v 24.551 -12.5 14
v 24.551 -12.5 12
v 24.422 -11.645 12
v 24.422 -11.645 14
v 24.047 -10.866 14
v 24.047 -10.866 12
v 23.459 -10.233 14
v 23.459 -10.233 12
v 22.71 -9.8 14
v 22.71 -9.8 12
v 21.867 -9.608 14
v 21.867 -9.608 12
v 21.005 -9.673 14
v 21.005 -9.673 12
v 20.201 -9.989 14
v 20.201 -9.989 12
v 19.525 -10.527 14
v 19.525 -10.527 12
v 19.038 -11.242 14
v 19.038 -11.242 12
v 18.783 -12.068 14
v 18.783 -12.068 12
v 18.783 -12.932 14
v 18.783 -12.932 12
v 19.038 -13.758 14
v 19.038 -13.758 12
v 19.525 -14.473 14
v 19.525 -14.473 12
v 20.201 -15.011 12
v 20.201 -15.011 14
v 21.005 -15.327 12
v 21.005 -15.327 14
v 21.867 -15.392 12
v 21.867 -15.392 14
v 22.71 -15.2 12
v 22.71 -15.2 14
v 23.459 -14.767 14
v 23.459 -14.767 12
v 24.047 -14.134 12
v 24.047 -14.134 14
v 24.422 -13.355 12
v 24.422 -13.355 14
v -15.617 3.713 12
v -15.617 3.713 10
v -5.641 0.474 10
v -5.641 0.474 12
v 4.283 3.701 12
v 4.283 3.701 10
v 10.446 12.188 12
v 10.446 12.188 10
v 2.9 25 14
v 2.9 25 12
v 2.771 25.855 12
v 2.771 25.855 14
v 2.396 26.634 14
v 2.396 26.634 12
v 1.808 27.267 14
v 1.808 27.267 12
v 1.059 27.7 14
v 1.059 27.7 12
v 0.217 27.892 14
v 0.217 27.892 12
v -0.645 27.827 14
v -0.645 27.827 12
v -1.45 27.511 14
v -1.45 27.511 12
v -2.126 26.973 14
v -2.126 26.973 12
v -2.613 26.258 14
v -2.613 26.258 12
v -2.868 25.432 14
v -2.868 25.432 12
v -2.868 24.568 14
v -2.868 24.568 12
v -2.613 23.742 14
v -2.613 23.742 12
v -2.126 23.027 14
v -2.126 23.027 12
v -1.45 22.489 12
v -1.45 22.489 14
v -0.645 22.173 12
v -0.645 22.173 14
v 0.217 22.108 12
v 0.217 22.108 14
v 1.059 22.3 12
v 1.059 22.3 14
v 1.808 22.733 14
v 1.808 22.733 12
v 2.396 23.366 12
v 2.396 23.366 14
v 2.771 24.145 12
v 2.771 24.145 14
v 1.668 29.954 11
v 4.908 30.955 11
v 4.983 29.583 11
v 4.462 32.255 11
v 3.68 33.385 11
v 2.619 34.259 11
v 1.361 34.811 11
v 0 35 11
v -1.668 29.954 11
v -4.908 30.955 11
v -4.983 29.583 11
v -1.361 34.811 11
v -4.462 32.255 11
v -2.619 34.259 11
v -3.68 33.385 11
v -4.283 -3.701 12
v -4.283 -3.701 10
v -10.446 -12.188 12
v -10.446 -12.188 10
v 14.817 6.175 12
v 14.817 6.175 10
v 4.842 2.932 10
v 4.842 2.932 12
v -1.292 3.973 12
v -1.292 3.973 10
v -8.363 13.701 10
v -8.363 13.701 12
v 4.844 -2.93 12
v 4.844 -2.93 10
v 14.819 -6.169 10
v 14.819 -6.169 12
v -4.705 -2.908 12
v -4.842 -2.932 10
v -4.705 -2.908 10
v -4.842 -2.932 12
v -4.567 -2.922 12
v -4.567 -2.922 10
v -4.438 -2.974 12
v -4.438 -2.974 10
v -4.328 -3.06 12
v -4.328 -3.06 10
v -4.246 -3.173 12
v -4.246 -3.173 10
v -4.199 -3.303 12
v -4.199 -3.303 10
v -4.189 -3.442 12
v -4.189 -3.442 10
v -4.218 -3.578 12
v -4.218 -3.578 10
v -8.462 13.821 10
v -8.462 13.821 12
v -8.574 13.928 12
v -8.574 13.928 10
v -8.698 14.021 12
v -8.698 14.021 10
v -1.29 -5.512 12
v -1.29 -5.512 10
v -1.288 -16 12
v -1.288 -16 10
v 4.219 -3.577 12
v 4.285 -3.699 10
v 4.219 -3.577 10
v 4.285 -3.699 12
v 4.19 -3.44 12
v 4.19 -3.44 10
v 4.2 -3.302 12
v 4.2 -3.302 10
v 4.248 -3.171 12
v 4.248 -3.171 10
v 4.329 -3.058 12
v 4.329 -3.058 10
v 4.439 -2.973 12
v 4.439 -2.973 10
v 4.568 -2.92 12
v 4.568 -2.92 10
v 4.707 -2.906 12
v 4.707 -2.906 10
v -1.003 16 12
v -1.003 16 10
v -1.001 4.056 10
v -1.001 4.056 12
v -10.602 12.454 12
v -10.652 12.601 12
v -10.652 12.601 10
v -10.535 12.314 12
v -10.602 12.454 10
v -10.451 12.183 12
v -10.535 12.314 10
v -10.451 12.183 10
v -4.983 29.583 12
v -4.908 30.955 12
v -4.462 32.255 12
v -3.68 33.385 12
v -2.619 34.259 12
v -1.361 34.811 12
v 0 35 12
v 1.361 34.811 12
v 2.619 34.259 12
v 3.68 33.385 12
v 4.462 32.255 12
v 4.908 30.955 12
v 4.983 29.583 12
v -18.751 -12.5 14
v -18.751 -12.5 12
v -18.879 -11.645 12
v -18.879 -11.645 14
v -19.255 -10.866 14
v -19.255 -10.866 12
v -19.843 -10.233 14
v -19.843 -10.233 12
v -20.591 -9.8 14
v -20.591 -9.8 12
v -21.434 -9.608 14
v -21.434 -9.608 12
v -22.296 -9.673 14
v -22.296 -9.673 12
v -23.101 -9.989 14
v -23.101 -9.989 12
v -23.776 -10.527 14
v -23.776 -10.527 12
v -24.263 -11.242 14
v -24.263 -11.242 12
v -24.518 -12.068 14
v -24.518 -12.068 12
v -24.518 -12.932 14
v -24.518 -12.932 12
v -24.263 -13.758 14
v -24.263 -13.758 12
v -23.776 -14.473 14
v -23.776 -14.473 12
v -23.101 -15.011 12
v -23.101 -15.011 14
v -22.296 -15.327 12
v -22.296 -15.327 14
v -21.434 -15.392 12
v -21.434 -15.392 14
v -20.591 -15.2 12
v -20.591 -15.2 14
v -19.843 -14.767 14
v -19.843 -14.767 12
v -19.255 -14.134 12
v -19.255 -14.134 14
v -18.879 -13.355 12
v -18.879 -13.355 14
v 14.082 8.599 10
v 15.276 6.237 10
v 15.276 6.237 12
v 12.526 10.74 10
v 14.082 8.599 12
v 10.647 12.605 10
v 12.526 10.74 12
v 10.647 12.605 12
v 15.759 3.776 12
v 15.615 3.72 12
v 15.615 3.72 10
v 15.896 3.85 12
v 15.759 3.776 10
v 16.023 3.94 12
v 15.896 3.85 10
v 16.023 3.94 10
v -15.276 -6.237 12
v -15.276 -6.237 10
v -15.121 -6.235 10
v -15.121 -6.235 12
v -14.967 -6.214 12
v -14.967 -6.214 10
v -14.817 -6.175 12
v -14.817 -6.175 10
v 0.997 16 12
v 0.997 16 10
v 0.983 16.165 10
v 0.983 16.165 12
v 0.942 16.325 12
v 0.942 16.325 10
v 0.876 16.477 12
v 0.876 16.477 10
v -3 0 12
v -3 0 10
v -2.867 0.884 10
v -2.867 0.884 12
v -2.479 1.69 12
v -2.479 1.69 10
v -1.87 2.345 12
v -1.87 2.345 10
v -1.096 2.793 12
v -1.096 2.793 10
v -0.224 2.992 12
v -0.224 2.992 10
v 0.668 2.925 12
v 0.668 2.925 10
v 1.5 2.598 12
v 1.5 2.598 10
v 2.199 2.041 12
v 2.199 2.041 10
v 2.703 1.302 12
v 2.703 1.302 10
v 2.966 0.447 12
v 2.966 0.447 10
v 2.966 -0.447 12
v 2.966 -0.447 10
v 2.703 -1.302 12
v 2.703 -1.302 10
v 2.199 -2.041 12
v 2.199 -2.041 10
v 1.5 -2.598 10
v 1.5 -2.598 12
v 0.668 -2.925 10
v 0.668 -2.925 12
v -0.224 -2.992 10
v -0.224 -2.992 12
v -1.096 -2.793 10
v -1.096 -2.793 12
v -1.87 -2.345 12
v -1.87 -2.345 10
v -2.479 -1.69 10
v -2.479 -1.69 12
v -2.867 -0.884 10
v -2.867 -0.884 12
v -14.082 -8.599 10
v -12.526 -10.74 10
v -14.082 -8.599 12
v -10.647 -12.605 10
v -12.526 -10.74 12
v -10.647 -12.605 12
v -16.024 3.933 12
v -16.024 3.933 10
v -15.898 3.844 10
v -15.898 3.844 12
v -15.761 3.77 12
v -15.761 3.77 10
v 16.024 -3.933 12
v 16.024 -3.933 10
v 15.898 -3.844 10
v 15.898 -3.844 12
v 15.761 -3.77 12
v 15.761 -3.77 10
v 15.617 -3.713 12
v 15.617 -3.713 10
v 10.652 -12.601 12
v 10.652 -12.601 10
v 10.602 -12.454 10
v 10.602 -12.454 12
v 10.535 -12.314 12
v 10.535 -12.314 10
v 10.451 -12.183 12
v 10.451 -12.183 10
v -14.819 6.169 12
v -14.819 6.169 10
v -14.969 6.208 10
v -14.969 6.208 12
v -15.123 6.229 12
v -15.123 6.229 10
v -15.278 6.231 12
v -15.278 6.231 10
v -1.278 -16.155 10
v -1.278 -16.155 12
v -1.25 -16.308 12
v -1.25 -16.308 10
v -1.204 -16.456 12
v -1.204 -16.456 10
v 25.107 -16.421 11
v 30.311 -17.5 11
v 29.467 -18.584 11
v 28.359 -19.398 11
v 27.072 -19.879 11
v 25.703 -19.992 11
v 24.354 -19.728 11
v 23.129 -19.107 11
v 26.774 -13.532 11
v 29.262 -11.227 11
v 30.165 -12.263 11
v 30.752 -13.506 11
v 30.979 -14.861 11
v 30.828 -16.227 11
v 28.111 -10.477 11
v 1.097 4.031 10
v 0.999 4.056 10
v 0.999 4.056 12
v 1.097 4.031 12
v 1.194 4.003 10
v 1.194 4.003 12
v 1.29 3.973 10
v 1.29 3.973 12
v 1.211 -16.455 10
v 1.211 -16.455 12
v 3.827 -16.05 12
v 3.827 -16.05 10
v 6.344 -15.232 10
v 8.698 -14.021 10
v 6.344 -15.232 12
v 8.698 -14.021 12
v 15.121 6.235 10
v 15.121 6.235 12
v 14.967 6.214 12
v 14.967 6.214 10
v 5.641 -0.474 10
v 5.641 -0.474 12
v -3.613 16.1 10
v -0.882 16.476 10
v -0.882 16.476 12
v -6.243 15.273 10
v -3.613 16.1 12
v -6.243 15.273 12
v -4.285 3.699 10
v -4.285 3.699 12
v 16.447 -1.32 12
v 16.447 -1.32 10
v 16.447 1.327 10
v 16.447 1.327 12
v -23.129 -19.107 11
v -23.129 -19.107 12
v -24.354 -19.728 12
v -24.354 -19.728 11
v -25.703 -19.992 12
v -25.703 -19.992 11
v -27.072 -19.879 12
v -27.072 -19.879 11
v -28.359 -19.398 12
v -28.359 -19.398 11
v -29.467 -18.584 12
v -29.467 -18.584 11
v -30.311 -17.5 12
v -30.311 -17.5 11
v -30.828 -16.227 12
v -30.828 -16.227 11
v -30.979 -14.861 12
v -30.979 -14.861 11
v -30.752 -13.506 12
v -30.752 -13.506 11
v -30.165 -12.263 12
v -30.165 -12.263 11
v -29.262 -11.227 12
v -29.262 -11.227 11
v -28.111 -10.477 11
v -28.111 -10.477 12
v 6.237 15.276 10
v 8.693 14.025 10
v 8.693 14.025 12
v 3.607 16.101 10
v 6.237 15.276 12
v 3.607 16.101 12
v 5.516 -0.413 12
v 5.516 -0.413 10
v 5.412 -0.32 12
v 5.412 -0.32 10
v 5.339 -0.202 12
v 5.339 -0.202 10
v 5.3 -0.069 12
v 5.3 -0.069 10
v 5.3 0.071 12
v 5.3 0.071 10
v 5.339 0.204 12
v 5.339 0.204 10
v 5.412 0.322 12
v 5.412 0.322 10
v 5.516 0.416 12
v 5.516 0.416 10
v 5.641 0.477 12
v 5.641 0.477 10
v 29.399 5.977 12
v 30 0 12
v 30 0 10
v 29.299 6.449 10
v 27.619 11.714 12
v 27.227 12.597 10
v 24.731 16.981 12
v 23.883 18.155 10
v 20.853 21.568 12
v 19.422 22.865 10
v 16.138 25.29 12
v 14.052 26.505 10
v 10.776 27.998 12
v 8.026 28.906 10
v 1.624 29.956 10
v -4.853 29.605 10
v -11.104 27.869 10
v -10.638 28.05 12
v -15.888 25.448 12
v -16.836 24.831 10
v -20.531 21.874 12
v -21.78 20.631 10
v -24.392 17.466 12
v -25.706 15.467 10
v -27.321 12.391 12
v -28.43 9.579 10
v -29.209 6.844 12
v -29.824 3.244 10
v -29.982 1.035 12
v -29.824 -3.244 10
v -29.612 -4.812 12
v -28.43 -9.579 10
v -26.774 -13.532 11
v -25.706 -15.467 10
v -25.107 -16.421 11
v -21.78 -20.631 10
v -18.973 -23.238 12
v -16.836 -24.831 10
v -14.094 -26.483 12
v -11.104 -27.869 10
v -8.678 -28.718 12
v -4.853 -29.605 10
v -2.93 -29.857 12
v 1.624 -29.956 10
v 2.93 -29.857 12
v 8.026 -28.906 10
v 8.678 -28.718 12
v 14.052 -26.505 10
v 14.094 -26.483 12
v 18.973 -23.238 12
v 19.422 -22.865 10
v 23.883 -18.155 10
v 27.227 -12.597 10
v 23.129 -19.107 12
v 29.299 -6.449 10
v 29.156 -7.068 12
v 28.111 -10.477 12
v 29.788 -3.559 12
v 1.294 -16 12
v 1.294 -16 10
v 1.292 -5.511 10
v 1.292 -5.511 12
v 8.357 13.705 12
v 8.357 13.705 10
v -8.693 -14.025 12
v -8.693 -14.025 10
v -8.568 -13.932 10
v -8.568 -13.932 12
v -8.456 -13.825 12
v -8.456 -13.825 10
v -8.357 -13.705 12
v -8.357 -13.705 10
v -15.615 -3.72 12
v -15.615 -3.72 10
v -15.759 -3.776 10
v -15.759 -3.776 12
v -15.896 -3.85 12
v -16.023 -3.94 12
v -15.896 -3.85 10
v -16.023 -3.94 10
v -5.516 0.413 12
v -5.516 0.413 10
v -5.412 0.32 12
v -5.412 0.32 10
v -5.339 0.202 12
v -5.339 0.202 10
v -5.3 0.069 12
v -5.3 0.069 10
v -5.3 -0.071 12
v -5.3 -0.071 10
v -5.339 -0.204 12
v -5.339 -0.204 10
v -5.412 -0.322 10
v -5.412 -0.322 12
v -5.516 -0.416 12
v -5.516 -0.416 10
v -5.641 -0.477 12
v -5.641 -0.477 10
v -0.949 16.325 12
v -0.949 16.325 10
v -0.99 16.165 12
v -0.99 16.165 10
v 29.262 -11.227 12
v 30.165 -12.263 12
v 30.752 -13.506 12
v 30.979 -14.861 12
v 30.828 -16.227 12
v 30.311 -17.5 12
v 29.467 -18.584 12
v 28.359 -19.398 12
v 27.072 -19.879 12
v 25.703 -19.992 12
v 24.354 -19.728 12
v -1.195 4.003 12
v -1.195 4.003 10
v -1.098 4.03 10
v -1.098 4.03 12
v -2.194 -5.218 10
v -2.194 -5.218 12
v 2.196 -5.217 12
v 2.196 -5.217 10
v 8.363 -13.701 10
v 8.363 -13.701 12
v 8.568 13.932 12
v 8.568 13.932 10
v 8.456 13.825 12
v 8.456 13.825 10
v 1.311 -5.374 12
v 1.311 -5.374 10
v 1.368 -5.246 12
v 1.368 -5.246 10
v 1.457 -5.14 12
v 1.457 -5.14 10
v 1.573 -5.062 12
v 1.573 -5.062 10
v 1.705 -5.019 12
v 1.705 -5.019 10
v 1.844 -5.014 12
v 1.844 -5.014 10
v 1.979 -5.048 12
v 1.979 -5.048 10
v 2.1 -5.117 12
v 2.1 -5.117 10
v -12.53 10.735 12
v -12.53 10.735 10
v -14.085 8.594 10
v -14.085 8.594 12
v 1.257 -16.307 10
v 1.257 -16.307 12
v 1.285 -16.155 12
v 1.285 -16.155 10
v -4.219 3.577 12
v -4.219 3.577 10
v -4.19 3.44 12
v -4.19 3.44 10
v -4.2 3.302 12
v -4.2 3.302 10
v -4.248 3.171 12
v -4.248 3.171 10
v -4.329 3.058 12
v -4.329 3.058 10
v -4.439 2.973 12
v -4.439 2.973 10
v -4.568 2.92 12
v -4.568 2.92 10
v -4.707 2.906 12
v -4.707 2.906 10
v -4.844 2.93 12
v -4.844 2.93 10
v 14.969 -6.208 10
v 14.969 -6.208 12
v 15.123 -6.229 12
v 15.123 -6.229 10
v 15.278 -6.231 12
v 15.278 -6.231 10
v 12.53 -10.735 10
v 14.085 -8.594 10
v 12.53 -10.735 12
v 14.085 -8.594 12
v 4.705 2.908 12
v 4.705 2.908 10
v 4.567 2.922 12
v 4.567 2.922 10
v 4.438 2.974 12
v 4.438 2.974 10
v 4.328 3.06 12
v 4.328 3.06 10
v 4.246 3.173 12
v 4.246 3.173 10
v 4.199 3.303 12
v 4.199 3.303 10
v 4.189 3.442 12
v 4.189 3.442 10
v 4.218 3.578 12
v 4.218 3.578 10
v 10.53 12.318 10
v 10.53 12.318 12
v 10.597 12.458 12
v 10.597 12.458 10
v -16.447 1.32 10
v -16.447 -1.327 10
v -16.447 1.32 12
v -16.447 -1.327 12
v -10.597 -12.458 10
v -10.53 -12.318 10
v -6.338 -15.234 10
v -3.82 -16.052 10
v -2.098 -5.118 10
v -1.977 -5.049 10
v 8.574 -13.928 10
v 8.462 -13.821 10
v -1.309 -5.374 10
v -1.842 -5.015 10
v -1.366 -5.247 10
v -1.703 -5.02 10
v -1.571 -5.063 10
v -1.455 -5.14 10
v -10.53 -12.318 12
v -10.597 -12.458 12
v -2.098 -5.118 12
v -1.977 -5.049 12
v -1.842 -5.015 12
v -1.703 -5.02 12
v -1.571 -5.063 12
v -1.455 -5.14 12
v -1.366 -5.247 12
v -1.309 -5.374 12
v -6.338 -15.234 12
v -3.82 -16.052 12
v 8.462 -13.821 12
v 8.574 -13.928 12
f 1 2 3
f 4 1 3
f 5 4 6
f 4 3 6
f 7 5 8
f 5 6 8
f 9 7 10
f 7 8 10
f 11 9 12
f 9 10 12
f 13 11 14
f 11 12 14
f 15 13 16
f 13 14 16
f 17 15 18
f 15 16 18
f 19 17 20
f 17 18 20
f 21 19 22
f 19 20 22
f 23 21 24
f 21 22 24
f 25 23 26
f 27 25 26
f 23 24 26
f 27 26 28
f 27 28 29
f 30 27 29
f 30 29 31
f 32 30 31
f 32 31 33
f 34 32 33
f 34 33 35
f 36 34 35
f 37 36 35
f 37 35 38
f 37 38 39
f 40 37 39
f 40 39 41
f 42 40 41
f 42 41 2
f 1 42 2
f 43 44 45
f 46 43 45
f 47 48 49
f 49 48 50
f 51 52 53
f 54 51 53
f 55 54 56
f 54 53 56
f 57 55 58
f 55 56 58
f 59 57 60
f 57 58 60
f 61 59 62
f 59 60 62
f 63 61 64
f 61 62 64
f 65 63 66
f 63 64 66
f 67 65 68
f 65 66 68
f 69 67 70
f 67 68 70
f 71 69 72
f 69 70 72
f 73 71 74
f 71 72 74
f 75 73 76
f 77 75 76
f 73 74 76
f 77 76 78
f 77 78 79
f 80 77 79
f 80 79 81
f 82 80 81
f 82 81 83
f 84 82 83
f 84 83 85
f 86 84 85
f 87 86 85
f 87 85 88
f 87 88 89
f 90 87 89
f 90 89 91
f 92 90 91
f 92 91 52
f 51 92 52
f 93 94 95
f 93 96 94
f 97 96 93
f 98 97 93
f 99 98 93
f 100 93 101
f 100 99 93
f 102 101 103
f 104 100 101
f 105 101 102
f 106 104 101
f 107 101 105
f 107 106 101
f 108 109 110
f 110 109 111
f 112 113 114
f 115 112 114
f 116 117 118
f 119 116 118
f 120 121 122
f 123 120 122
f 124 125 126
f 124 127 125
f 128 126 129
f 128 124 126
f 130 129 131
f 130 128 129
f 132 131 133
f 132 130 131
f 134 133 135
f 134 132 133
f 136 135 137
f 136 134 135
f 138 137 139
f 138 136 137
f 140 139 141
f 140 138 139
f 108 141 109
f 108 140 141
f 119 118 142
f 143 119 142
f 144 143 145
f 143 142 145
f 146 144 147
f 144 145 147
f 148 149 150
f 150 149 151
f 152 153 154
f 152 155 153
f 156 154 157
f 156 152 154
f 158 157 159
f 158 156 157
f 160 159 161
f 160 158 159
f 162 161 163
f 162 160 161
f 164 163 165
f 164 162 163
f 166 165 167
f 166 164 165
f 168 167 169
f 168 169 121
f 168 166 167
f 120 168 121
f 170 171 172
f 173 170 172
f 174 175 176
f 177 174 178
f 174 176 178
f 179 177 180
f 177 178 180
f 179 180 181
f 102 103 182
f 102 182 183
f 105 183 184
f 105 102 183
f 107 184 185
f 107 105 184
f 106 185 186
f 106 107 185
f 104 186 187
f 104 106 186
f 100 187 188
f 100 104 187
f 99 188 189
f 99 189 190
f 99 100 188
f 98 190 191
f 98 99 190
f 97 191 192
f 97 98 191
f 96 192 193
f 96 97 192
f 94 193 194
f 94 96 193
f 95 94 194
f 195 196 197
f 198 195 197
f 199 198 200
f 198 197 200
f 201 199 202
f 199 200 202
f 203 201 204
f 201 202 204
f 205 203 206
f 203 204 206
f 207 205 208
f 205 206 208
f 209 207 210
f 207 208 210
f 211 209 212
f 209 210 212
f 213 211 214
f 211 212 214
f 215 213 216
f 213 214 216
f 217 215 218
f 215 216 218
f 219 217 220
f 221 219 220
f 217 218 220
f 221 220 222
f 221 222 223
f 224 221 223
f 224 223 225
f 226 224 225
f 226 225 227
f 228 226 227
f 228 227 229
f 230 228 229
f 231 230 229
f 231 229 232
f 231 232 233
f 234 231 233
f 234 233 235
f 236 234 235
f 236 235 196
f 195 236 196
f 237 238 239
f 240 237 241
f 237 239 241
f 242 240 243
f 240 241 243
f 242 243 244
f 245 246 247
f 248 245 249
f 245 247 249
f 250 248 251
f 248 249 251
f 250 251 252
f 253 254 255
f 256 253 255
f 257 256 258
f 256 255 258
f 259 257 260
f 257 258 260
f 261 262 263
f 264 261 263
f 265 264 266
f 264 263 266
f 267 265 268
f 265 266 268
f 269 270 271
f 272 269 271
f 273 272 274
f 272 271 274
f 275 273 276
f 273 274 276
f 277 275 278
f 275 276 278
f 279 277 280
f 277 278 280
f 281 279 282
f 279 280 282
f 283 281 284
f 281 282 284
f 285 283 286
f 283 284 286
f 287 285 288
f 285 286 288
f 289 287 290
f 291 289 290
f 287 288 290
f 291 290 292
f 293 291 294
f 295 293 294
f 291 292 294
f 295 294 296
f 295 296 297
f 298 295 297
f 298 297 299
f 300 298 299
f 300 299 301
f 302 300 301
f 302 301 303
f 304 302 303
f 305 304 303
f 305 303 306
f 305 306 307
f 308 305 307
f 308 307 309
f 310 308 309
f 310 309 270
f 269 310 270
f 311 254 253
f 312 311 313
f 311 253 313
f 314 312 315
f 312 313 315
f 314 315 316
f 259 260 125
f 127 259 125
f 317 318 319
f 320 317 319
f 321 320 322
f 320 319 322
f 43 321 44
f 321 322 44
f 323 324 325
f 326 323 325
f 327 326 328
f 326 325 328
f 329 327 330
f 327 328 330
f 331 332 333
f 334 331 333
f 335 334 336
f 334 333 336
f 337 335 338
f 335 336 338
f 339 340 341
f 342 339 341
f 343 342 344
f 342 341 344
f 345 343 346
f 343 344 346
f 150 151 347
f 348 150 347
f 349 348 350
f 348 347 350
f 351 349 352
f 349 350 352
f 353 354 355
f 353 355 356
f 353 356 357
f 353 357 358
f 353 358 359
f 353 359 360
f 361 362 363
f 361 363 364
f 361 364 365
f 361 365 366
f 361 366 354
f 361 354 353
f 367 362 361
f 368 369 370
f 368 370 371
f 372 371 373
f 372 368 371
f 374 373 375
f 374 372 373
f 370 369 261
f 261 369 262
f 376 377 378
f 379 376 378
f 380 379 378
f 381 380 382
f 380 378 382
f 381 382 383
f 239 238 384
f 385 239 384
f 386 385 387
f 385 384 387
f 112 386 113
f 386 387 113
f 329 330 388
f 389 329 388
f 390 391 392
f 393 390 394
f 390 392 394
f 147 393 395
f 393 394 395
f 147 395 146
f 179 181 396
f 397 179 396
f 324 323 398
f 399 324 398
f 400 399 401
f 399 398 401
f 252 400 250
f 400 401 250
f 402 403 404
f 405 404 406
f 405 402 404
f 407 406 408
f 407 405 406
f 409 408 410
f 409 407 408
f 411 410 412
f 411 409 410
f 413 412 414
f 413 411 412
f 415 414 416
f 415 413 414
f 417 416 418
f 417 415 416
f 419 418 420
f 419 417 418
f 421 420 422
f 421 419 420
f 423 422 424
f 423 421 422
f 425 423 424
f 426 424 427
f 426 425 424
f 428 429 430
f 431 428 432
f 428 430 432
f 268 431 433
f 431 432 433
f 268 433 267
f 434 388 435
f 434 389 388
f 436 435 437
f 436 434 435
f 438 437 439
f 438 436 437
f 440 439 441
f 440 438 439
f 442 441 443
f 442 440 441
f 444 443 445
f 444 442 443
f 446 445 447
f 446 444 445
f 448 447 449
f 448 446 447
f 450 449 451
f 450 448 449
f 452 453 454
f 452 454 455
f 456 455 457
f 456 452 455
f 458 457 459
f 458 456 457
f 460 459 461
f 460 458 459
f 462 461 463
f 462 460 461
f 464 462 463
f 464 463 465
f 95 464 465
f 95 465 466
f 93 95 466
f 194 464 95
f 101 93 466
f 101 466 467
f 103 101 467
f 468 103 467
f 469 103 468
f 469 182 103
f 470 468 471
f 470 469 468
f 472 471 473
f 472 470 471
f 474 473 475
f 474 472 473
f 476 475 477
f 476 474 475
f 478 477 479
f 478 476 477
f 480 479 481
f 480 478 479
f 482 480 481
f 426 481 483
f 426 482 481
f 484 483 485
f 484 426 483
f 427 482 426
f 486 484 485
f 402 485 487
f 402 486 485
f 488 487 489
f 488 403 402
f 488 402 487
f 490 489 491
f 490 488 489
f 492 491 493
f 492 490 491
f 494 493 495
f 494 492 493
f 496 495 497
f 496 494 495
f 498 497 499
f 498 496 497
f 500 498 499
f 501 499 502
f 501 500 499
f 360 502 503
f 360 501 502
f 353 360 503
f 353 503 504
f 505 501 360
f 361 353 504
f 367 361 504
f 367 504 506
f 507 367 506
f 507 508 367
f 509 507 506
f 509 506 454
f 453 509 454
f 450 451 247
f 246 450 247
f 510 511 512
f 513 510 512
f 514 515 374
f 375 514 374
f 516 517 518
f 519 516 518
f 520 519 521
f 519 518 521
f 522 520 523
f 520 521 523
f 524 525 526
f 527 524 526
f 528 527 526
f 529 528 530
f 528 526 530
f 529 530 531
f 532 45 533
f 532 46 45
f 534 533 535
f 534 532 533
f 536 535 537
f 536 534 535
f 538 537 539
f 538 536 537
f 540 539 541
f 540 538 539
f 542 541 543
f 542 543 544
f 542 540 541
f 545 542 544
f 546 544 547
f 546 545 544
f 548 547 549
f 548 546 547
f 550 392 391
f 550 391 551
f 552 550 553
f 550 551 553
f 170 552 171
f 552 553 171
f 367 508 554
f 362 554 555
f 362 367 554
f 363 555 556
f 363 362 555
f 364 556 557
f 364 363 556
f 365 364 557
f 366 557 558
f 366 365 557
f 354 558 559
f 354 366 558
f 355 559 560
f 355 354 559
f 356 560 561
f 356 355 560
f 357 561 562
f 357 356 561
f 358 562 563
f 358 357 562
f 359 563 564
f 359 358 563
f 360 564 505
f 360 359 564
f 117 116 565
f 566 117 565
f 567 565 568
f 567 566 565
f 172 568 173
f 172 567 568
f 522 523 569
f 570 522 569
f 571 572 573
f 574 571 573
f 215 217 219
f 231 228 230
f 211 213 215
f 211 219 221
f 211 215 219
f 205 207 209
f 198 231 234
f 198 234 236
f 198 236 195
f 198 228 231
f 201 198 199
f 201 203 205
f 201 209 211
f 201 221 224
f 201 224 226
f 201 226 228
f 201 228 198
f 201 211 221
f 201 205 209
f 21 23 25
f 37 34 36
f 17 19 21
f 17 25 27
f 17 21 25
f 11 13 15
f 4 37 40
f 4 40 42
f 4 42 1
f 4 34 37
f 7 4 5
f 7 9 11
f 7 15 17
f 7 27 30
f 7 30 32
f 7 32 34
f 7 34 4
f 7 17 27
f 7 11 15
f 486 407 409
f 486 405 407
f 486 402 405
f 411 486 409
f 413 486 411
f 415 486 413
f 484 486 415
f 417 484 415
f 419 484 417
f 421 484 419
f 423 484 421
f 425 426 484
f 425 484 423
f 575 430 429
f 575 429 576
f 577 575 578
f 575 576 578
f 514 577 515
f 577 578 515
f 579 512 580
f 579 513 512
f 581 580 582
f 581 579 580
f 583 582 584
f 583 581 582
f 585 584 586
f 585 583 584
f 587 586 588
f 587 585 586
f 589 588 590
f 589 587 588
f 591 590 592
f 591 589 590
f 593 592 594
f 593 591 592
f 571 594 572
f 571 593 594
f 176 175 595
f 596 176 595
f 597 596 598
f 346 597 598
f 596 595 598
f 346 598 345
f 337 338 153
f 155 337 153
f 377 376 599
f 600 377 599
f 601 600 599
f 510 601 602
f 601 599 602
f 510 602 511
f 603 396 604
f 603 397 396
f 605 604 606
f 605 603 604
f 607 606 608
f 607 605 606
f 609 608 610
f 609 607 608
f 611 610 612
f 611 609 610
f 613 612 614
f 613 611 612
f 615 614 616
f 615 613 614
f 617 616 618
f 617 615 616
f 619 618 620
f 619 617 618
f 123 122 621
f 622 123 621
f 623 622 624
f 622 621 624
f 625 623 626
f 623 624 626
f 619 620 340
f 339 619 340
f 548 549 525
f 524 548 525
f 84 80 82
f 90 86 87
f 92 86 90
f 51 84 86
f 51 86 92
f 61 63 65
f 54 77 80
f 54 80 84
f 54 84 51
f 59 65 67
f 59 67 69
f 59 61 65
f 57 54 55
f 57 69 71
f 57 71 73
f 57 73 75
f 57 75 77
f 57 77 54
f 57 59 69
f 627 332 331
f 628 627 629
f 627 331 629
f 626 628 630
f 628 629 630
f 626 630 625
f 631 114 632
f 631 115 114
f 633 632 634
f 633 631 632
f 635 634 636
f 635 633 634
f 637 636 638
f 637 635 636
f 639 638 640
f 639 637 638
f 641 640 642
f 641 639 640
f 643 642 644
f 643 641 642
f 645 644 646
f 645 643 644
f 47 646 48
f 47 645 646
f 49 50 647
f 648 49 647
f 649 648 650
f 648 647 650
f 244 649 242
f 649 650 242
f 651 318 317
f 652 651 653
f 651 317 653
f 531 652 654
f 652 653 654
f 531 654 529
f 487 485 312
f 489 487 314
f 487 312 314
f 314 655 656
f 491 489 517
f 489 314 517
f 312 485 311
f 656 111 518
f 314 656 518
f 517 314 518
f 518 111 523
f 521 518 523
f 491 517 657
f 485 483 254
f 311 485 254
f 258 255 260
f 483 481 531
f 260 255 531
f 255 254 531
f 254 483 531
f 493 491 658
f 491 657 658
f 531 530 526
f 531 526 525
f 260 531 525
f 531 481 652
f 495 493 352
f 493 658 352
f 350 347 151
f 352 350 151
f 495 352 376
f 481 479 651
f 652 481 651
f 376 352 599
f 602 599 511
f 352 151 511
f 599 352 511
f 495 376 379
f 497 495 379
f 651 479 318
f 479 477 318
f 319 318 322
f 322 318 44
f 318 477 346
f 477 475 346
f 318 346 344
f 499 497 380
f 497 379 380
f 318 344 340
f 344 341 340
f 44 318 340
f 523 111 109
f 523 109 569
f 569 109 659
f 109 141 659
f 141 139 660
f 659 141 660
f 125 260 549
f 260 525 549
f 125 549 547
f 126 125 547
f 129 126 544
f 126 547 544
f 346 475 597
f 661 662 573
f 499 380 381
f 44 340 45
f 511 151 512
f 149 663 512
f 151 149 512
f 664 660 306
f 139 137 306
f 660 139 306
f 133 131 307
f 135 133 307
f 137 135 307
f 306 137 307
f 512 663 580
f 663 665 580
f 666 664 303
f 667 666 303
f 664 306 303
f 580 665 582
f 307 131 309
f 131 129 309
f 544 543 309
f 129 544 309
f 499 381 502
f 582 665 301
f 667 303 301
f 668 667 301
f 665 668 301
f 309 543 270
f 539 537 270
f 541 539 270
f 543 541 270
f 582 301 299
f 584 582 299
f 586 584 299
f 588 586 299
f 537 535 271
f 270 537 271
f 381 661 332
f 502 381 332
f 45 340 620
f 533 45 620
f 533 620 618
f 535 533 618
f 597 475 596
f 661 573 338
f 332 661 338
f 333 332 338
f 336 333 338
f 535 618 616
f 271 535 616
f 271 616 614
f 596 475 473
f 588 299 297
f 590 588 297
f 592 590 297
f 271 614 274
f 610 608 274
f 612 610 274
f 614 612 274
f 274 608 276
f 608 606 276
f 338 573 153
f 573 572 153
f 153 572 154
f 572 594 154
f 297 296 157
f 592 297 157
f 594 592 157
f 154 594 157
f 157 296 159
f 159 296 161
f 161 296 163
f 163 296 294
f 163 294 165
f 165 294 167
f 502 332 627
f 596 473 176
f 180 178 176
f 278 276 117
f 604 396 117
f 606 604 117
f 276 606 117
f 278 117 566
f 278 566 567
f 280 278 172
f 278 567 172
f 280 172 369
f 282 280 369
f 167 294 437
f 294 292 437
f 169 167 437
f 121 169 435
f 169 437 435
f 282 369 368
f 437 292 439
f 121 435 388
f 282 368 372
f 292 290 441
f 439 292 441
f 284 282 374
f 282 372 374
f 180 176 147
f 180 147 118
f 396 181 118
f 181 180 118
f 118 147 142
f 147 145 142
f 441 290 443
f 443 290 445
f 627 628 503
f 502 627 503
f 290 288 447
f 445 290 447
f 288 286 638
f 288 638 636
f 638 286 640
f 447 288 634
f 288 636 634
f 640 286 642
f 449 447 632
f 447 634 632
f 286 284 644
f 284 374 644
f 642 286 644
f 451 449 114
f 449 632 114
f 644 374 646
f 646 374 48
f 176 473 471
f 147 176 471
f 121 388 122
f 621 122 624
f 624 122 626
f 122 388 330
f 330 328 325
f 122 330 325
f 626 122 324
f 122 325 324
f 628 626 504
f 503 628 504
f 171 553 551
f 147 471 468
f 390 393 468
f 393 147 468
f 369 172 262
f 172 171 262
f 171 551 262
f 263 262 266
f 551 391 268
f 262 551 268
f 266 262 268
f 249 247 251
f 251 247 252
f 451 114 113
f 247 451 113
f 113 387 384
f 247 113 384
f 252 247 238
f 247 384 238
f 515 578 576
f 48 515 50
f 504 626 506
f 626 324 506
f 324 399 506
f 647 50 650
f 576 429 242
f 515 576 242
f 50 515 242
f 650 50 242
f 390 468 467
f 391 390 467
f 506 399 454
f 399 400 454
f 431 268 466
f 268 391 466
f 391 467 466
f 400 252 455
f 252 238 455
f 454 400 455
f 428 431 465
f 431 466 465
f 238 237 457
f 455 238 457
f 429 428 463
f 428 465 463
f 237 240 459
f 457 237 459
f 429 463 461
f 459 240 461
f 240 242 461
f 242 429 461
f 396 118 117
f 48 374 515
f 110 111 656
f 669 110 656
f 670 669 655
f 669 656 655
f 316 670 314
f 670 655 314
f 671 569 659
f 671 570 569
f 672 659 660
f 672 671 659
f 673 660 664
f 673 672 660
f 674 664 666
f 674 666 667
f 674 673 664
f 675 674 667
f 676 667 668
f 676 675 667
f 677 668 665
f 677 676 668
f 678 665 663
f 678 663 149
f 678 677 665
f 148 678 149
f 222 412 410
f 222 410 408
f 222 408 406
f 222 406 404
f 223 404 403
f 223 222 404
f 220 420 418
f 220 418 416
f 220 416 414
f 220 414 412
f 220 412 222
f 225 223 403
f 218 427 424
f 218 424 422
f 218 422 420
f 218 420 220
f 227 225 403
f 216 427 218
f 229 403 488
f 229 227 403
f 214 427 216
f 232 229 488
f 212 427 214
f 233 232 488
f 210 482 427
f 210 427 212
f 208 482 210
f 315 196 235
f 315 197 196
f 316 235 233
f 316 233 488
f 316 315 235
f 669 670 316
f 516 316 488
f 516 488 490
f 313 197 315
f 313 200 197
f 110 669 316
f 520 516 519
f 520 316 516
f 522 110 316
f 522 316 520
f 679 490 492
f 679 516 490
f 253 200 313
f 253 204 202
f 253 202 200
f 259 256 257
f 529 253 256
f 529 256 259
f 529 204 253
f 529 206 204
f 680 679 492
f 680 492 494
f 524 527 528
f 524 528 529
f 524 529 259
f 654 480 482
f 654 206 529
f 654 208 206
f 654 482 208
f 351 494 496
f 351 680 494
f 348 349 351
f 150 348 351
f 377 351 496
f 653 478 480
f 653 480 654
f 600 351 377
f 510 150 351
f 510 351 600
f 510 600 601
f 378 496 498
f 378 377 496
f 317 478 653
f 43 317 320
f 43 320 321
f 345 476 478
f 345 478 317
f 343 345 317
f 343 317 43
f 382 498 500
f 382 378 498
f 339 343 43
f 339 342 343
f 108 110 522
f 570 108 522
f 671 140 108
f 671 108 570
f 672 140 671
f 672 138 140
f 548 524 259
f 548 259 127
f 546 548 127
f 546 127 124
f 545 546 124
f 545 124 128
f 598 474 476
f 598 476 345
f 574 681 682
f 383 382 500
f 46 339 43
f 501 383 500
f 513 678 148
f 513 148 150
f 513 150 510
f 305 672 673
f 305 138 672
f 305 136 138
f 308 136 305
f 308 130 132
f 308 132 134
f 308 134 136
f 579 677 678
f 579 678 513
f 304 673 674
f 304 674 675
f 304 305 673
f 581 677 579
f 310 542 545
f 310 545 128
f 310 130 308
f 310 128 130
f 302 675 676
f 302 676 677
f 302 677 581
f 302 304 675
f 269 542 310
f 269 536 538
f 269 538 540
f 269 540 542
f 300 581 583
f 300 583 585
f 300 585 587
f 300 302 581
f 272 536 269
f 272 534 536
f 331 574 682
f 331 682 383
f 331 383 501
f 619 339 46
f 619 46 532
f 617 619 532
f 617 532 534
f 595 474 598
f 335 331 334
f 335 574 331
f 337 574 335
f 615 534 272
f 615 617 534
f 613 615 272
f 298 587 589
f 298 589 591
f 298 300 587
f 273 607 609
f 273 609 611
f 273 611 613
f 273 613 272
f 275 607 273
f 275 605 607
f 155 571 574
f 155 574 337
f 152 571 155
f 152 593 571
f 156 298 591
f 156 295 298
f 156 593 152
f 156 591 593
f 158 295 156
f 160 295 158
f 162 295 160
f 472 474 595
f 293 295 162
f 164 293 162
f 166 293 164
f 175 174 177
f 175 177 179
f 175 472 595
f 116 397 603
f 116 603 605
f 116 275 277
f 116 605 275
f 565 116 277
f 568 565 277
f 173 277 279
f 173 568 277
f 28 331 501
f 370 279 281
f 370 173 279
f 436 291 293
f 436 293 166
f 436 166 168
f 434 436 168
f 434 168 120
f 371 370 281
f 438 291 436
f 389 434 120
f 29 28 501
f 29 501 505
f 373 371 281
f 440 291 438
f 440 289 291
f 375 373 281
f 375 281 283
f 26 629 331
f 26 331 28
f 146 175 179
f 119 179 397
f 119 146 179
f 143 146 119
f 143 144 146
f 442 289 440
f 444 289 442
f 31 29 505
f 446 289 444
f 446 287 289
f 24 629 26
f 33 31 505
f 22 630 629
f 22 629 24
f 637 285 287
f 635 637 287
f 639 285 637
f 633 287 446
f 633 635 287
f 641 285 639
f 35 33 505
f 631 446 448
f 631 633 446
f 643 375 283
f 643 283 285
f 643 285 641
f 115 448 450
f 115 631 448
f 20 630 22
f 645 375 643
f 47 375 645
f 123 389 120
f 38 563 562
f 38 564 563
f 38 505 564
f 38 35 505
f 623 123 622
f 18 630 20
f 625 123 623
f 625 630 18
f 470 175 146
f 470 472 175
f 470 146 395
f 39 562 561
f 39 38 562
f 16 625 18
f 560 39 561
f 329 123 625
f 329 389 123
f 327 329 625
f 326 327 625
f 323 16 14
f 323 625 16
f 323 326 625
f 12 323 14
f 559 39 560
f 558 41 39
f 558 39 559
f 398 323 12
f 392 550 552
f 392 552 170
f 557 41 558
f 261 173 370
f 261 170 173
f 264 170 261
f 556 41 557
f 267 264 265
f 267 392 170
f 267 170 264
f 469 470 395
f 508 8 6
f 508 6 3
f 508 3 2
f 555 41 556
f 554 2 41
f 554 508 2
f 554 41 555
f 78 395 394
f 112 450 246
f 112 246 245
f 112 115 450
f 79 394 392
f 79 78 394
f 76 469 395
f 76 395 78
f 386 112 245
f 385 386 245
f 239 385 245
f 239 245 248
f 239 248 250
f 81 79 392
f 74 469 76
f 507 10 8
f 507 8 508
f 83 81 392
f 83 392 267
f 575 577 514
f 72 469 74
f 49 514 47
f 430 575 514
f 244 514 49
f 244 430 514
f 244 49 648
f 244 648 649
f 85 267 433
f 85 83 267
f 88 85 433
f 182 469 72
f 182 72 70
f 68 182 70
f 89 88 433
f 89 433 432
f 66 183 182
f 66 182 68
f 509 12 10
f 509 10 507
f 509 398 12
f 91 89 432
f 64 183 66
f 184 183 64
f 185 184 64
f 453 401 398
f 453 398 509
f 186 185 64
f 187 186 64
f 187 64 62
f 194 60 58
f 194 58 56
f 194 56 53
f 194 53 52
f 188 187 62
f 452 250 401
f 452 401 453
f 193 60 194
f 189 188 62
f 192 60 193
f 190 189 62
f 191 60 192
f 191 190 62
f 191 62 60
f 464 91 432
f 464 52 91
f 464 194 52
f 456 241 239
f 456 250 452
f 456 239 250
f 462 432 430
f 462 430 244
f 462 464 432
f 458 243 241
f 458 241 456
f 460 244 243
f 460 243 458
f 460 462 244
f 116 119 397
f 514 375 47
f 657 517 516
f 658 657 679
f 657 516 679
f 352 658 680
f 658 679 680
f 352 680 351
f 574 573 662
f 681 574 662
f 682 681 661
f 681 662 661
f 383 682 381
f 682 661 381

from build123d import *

# Parameters (mm, degrees)
BOSS_EXTRUDE1_DEPTH    = 2
BOSS_EXTRUDE1_2_DEPTH  = 2
BOSS_EXTRUDE1_3_DEPTH  = 2
BOSS_EXTRUDE1_4_DEPTH  = 2
BOSS_EXTRUDE1_5_DEPTH  = 2
BOSS_EXTRUDE1_6_DEPTH  = 2
BOSS_EXTRUDE1_7_DEPTH  = 2
BOSS_EXTRUDE1_8_DEPTH  = 2
BOSS_EXTRUDE1_9_DEPTH  = 2
BOSS_EXTRUDE1_10_DEPTH = 2
SKETCH3_R              = 30
SKETCH3_R_2            = 16.5
BOSS_EXTRUDE2_DEPTH    = 2
SKETCH4_R              = 2.9
BOSS_EXTRUDE3_DEPTH    = 2
SKETCH6_R              = 5
BOSS_EXTRUDE4_DEPTH    = 1
SKETCH13_R             = 4.177329345
BOSS_EXTRUDE6_DEPTH    = 2
FILLET2_R              = 0.5
SKETCH14_R             = 3
CUT_EXTRUDE1_DEPTH     = 20


with BuildPart() as part:
    # Sketch2 → Boss-Extrude1 (new body)
    with BuildSketch(Plane.XY.offset(10)):
        with BuildLine():
            Line((8.357492916, 13.704694326), (0.999285991, 3.572733706))
            Line((0.999285991, 3.572733706), (0.999663781, 1.6824161))
            Line((0.999663781, 1.6824161), (3.379039645, 2.45604795))
            Line((3.379039645, 2.45604795), (10.446460828, 12.187608075))
            ThreePointArc((10.446460828, 12.187608075), (10.160519997, 13.990635156), (8.357492916, 13.704694326))
        make_face()
    extrude(amount=BOSS_EXTRUDE1_DEPTH)


with BuildPart() as body_2:
    # Sketch2 → Boss-Extrude1 2 (new body)
    with BuildSketch(Plane.XY.offset(10)):
        with BuildLine():
            Line((0.999285991, 3.572733706), (0.996802301, 16.000199535))
            ThreePointArc((0.996802301, 16.000199535), (-0.003397534, 16.99999966), (-1.003197659, 15.999799826))
            Line((-1.003197659, 15.999799826), (-1.000713969, 3.572333996))
            Line((-1.000713969, 3.572333996), (-0.000438912, 2.196151958))
            Line((-0.000438912, 2.196151958), (0.999285991, 3.572733706))
        make_face()
    extrude(amount=BOSS_EXTRUDE1_2_DEPTH)


with BuildPart() as body_3:
    # Sketch2 → Boss-Extrude1 3 (new body)
    with BuildSketch(Plane.XY.offset(10)):
        with BuildLine():
            Line((-1.000336179, 1.68201639), (-1.000713969, 3.572333996))
            Line((-1.000713969, 3.572333996), (-8.362970151, 13.701352658))
            ThreePointArc((-8.362970151, 13.701352658), (-10.166111381, 13.986572778), (-10.451331501, 12.183431547))
            Line((-10.451331501, 12.183431547), (-3.380021082, 2.454697118))
            Line((-3.380021082, 2.454697118), (-1.000336179, 1.68201639))
        make_face()
    extrude(amount=BOSS_EXTRUDE1_3_DEPTH)


with BuildPart() as body_4:
    # Sketch2 → Boss-Extrude1 4 (new body)
    with BuildSketch(Plane.XY.offset(10)):
        with BuildLine():
            Line((-2.088800262, 0.678230847), (-3.380021082, 2.454697118))
            Line((-3.380021082, 2.454697118), (-14.819238004, 6.168996626))
            ThreePointArc((-14.819238004, 6.168996626), (-16.445658083, 5.339884727), (-15.616546184, 3.713464648))
            Line((-15.616546184, 3.713464648), (-4.177329262, -0.00083486))
            Line((-4.177329262, -0.00083486), (-2.088800262, 0.678230847))
        make_face()
    extrude(amount=BOSS_EXTRUDE1_4_DEPTH)


with BuildPart() as body_5:
    # Sketch2 → Boss-Extrude1 5 (new body)
    with BuildSketch(Plane.XY.offset(10)):
        with BuildLine():
            Line((-2.088529, -0.679065707), (-4.177329262, -0.00083486))
            Line((-4.177329262, -0.00083486), (-15.615060628, -3.71970644))
            ThreePointArc((-15.615060628, -3.71970644), (-16.443522365, -5.346457793), (-14.816771011, -6.17491953))
            Line((-14.816771011, -6.17491953), (-3.379039645, -2.45604795))
            Line((-3.379039645, -2.45604795), (-2.088529, -0.679065707))
        make_face()
    extrude(amount=BOSS_EXTRUDE1_5_DEPTH)


with BuildPart() as body_6:
    # Sketch2 → Boss-Extrude1 6 (new body)
    with BuildSketch(Plane.XY.offset(10)):
        with BuildLine():
            Line((-1.290510646, -1.776982243), (-3.379039645, -2.45604795))
            Line((-3.379039645, -2.45604795), (-10.446460828, -12.187608075))
            ThreePointArc((-10.446460828, -12.187608075), (-10.160519997, -13.990635156), (-8.357492916, -13.704694326))
            Line((-8.357492916, -13.704694326), (-1.290071734, -3.973134201))
            Line((-1.290071734, -3.973134201), (-1.290510646, -1.776982243))
        make_face()
    extrude(amount=BOSS_EXTRUDE1_6_DEPTH)


with BuildPart() as body_7:
    # Sketch2 → Boss-Extrude1 7 (new body)
    with BuildSketch(Plane.XY.offset(10)):
        with BuildLine():
            Line((1.294063412, -15.999741695), (1.291659732, -3.972618229))
            Line((1.291659732, -3.972618229), (0.000438912, -2.196151958))
            Line((0.000438912, -2.196151958), (-1.290071734, -3.973134201))
            Line((-1.290071734, -3.973134201), (-1.287668054, -16.000257666))
            ThreePointArc((-1.287668054, -16.000257666), (0.003455665, -17.290865413), (1.294063412, -15.999741695))
        make_face()
    extrude(amount=BOSS_EXTRUDE1_7_DEPTH)


with BuildPart() as body_8:
    # Sketch2 → Boss-Extrude1 8 (new body)
    with BuildSketch(Plane.XY.offset(10)):
        with BuildLine():
            Line((10.451331501, -12.183431547), (3.380021082, -2.454697118))
            Line((3.380021082, -2.454697118), (1.29122082, -1.776466271))
            Line((1.29122082, -1.776466271), (1.291659732, -3.972618229))
            Line((1.291659732, -3.972618229), (8.362970151, -13.701352658))
            ThreePointArc((8.362970151, -13.701352658), (10.166111381, -13.986572778), (10.451331501, -12.183431547))
        make_face()
    extrude(amount=BOSS_EXTRUDE1_8_DEPTH)


with BuildPart() as body_9:
    # Sketch2 → Boss-Extrude1 9 (new body)
    with BuildSketch(Plane.XY.offset(10)):
        with BuildLine():
            Line((15.616546184, -3.713464648), (4.177329262, 0.00083486))
            Line((4.177329262, 0.00083486), (2.088800262, -0.678230847))
            Line((2.088800262, -0.678230847), (3.380021082, -2.454697118))
            Line((3.380021082, -2.454697118), (14.819238004, -6.168996626))
            ThreePointArc((14.819238004, -6.168996626), (16.445658083, -5.339884727), (15.616546184, -3.713464648))
        make_face()
    extrude(amount=BOSS_EXTRUDE1_9_DEPTH)


with BuildPart() as body_10:
    # Sketch2 → Boss-Extrude1 10 (new body)
    with BuildSketch(Plane.XY.offset(10)):
        with BuildLine():
            Line((14.816771011, 6.17491953), (3.379039645, 2.45604795))
            Line((3.379039645, 2.45604795), (2.088529, 0.679065707))
            Line((2.088529, 0.679065707), (4.177329262, 0.00083486))
            Line((4.177329262, 0.00083486), (15.615060628, 3.71970644))
            ThreePointArc((15.615060628, 3.71970644), (16.443522365, 5.346457793), (14.816771011, 6.17491953))
        make_face()
    extrude(amount=BOSS_EXTRUDE1_10_DEPTH)


with BuildPart() as body_11:
    # Sketch3 → Boss-Extrude2 (new body)
    with BuildSketch(Plane.XY.offset(12)):
        Circle(SKETCH3_R)
        Circle(SKETCH3_R_2, mode=Mode.SUBTRACT)
    extrude(amount=-BOSS_EXTRUDE2_DEPTH)

    # Sketch4 → Boss-Extrude3 (add)
    with BuildSketch(Plane.XY.offset(12)):
        with Locations((0, 25)):
            Circle(SKETCH4_R)
        with Locations((21.650635095, -12.5)):
            Circle(SKETCH4_R)
        with Locations((-21.650635095, -12.5)):
            Circle(SKETCH4_R)
    extrude(amount=BOSS_EXTRUDE3_DEPTH)

    # Sketch6 → Boss-Extrude4 (add)
    with BuildSketch(Plane(origin=(0, 0, 11), x_dir=(-1, 0, 0), z_dir=(0, 0, -1))):
        with Locations((0, 30)):
            Circle(SKETCH6_R)
        with Locations((25.980762114, -15)):
            Circle(SKETCH6_R)
        with Locations((-25.980762114, -15)):
            Circle(SKETCH6_R)
    extrude(amount=-BOSS_EXTRUDE4_DEPTH)


    add(part.part)  # Boss-Extrude6 merges part

    add(body_3.part)  # Boss-Extrude6 merges body 3

    add(body_5.part)  # Boss-Extrude6 merges body 5

    add(body_7.part)  # Boss-Extrude6 merges body 7

    add(body_9.part)  # Boss-Extrude6 merges body 9

    add(body_2.part)  # Boss-Extrude6 merges body 2

    add(body_4.part)  # Boss-Extrude6 merges body 4

    add(body_6.part)  # Boss-Extrude6 merges body 6

    add(body_8.part)  # Boss-Extrude6 merges body 8

    add(body_10.part)  # Boss-Extrude6 merges body 10
    # Sketch13 → Boss-Extrude6 (add)
    with BuildSketch(Plane(origin=(0, 0, 10), x_dir=(-1, 0, 0), z_dir=(0, 0, -1))):
        Circle(SKETCH13_R)
    extrude(amount=-BOSS_EXTRUDE6_DEPTH)

    # Fillet2
    fillet2_edges = [body_11.edges().sort_by_distance(p)[0] for p in [
        (-1.290071734, -3.973134201, 11),
        (1.291659732, -3.972618229, 11),
        (3.380021082, -2.454697118, 11),
        (4.177329262, 0.00083486, 11),
        (3.379039645, 2.45604795, 11),
        (-3.380021082, 2.454697118, 11),
        (-4.177329262, -0.00083486, 11),
        (-3.379039645, -2.45604795, 11),
    ]]
    fillet(fillet2_edges, radius=FILLET2_R)

    # Sketch14 → Cut-Extrude1 (cut)
    with BuildSketch(Plane(origin=(0, 0, 10), x_dir=(-1, 0, 0), z_dir=(0, 0, -1))):
        Circle(SKETCH14_R)
    extrude(amount=-CUT_EXTRUDE1_DEPTH, mode=Mode.SUBTRACT)


solid = body_11.part
